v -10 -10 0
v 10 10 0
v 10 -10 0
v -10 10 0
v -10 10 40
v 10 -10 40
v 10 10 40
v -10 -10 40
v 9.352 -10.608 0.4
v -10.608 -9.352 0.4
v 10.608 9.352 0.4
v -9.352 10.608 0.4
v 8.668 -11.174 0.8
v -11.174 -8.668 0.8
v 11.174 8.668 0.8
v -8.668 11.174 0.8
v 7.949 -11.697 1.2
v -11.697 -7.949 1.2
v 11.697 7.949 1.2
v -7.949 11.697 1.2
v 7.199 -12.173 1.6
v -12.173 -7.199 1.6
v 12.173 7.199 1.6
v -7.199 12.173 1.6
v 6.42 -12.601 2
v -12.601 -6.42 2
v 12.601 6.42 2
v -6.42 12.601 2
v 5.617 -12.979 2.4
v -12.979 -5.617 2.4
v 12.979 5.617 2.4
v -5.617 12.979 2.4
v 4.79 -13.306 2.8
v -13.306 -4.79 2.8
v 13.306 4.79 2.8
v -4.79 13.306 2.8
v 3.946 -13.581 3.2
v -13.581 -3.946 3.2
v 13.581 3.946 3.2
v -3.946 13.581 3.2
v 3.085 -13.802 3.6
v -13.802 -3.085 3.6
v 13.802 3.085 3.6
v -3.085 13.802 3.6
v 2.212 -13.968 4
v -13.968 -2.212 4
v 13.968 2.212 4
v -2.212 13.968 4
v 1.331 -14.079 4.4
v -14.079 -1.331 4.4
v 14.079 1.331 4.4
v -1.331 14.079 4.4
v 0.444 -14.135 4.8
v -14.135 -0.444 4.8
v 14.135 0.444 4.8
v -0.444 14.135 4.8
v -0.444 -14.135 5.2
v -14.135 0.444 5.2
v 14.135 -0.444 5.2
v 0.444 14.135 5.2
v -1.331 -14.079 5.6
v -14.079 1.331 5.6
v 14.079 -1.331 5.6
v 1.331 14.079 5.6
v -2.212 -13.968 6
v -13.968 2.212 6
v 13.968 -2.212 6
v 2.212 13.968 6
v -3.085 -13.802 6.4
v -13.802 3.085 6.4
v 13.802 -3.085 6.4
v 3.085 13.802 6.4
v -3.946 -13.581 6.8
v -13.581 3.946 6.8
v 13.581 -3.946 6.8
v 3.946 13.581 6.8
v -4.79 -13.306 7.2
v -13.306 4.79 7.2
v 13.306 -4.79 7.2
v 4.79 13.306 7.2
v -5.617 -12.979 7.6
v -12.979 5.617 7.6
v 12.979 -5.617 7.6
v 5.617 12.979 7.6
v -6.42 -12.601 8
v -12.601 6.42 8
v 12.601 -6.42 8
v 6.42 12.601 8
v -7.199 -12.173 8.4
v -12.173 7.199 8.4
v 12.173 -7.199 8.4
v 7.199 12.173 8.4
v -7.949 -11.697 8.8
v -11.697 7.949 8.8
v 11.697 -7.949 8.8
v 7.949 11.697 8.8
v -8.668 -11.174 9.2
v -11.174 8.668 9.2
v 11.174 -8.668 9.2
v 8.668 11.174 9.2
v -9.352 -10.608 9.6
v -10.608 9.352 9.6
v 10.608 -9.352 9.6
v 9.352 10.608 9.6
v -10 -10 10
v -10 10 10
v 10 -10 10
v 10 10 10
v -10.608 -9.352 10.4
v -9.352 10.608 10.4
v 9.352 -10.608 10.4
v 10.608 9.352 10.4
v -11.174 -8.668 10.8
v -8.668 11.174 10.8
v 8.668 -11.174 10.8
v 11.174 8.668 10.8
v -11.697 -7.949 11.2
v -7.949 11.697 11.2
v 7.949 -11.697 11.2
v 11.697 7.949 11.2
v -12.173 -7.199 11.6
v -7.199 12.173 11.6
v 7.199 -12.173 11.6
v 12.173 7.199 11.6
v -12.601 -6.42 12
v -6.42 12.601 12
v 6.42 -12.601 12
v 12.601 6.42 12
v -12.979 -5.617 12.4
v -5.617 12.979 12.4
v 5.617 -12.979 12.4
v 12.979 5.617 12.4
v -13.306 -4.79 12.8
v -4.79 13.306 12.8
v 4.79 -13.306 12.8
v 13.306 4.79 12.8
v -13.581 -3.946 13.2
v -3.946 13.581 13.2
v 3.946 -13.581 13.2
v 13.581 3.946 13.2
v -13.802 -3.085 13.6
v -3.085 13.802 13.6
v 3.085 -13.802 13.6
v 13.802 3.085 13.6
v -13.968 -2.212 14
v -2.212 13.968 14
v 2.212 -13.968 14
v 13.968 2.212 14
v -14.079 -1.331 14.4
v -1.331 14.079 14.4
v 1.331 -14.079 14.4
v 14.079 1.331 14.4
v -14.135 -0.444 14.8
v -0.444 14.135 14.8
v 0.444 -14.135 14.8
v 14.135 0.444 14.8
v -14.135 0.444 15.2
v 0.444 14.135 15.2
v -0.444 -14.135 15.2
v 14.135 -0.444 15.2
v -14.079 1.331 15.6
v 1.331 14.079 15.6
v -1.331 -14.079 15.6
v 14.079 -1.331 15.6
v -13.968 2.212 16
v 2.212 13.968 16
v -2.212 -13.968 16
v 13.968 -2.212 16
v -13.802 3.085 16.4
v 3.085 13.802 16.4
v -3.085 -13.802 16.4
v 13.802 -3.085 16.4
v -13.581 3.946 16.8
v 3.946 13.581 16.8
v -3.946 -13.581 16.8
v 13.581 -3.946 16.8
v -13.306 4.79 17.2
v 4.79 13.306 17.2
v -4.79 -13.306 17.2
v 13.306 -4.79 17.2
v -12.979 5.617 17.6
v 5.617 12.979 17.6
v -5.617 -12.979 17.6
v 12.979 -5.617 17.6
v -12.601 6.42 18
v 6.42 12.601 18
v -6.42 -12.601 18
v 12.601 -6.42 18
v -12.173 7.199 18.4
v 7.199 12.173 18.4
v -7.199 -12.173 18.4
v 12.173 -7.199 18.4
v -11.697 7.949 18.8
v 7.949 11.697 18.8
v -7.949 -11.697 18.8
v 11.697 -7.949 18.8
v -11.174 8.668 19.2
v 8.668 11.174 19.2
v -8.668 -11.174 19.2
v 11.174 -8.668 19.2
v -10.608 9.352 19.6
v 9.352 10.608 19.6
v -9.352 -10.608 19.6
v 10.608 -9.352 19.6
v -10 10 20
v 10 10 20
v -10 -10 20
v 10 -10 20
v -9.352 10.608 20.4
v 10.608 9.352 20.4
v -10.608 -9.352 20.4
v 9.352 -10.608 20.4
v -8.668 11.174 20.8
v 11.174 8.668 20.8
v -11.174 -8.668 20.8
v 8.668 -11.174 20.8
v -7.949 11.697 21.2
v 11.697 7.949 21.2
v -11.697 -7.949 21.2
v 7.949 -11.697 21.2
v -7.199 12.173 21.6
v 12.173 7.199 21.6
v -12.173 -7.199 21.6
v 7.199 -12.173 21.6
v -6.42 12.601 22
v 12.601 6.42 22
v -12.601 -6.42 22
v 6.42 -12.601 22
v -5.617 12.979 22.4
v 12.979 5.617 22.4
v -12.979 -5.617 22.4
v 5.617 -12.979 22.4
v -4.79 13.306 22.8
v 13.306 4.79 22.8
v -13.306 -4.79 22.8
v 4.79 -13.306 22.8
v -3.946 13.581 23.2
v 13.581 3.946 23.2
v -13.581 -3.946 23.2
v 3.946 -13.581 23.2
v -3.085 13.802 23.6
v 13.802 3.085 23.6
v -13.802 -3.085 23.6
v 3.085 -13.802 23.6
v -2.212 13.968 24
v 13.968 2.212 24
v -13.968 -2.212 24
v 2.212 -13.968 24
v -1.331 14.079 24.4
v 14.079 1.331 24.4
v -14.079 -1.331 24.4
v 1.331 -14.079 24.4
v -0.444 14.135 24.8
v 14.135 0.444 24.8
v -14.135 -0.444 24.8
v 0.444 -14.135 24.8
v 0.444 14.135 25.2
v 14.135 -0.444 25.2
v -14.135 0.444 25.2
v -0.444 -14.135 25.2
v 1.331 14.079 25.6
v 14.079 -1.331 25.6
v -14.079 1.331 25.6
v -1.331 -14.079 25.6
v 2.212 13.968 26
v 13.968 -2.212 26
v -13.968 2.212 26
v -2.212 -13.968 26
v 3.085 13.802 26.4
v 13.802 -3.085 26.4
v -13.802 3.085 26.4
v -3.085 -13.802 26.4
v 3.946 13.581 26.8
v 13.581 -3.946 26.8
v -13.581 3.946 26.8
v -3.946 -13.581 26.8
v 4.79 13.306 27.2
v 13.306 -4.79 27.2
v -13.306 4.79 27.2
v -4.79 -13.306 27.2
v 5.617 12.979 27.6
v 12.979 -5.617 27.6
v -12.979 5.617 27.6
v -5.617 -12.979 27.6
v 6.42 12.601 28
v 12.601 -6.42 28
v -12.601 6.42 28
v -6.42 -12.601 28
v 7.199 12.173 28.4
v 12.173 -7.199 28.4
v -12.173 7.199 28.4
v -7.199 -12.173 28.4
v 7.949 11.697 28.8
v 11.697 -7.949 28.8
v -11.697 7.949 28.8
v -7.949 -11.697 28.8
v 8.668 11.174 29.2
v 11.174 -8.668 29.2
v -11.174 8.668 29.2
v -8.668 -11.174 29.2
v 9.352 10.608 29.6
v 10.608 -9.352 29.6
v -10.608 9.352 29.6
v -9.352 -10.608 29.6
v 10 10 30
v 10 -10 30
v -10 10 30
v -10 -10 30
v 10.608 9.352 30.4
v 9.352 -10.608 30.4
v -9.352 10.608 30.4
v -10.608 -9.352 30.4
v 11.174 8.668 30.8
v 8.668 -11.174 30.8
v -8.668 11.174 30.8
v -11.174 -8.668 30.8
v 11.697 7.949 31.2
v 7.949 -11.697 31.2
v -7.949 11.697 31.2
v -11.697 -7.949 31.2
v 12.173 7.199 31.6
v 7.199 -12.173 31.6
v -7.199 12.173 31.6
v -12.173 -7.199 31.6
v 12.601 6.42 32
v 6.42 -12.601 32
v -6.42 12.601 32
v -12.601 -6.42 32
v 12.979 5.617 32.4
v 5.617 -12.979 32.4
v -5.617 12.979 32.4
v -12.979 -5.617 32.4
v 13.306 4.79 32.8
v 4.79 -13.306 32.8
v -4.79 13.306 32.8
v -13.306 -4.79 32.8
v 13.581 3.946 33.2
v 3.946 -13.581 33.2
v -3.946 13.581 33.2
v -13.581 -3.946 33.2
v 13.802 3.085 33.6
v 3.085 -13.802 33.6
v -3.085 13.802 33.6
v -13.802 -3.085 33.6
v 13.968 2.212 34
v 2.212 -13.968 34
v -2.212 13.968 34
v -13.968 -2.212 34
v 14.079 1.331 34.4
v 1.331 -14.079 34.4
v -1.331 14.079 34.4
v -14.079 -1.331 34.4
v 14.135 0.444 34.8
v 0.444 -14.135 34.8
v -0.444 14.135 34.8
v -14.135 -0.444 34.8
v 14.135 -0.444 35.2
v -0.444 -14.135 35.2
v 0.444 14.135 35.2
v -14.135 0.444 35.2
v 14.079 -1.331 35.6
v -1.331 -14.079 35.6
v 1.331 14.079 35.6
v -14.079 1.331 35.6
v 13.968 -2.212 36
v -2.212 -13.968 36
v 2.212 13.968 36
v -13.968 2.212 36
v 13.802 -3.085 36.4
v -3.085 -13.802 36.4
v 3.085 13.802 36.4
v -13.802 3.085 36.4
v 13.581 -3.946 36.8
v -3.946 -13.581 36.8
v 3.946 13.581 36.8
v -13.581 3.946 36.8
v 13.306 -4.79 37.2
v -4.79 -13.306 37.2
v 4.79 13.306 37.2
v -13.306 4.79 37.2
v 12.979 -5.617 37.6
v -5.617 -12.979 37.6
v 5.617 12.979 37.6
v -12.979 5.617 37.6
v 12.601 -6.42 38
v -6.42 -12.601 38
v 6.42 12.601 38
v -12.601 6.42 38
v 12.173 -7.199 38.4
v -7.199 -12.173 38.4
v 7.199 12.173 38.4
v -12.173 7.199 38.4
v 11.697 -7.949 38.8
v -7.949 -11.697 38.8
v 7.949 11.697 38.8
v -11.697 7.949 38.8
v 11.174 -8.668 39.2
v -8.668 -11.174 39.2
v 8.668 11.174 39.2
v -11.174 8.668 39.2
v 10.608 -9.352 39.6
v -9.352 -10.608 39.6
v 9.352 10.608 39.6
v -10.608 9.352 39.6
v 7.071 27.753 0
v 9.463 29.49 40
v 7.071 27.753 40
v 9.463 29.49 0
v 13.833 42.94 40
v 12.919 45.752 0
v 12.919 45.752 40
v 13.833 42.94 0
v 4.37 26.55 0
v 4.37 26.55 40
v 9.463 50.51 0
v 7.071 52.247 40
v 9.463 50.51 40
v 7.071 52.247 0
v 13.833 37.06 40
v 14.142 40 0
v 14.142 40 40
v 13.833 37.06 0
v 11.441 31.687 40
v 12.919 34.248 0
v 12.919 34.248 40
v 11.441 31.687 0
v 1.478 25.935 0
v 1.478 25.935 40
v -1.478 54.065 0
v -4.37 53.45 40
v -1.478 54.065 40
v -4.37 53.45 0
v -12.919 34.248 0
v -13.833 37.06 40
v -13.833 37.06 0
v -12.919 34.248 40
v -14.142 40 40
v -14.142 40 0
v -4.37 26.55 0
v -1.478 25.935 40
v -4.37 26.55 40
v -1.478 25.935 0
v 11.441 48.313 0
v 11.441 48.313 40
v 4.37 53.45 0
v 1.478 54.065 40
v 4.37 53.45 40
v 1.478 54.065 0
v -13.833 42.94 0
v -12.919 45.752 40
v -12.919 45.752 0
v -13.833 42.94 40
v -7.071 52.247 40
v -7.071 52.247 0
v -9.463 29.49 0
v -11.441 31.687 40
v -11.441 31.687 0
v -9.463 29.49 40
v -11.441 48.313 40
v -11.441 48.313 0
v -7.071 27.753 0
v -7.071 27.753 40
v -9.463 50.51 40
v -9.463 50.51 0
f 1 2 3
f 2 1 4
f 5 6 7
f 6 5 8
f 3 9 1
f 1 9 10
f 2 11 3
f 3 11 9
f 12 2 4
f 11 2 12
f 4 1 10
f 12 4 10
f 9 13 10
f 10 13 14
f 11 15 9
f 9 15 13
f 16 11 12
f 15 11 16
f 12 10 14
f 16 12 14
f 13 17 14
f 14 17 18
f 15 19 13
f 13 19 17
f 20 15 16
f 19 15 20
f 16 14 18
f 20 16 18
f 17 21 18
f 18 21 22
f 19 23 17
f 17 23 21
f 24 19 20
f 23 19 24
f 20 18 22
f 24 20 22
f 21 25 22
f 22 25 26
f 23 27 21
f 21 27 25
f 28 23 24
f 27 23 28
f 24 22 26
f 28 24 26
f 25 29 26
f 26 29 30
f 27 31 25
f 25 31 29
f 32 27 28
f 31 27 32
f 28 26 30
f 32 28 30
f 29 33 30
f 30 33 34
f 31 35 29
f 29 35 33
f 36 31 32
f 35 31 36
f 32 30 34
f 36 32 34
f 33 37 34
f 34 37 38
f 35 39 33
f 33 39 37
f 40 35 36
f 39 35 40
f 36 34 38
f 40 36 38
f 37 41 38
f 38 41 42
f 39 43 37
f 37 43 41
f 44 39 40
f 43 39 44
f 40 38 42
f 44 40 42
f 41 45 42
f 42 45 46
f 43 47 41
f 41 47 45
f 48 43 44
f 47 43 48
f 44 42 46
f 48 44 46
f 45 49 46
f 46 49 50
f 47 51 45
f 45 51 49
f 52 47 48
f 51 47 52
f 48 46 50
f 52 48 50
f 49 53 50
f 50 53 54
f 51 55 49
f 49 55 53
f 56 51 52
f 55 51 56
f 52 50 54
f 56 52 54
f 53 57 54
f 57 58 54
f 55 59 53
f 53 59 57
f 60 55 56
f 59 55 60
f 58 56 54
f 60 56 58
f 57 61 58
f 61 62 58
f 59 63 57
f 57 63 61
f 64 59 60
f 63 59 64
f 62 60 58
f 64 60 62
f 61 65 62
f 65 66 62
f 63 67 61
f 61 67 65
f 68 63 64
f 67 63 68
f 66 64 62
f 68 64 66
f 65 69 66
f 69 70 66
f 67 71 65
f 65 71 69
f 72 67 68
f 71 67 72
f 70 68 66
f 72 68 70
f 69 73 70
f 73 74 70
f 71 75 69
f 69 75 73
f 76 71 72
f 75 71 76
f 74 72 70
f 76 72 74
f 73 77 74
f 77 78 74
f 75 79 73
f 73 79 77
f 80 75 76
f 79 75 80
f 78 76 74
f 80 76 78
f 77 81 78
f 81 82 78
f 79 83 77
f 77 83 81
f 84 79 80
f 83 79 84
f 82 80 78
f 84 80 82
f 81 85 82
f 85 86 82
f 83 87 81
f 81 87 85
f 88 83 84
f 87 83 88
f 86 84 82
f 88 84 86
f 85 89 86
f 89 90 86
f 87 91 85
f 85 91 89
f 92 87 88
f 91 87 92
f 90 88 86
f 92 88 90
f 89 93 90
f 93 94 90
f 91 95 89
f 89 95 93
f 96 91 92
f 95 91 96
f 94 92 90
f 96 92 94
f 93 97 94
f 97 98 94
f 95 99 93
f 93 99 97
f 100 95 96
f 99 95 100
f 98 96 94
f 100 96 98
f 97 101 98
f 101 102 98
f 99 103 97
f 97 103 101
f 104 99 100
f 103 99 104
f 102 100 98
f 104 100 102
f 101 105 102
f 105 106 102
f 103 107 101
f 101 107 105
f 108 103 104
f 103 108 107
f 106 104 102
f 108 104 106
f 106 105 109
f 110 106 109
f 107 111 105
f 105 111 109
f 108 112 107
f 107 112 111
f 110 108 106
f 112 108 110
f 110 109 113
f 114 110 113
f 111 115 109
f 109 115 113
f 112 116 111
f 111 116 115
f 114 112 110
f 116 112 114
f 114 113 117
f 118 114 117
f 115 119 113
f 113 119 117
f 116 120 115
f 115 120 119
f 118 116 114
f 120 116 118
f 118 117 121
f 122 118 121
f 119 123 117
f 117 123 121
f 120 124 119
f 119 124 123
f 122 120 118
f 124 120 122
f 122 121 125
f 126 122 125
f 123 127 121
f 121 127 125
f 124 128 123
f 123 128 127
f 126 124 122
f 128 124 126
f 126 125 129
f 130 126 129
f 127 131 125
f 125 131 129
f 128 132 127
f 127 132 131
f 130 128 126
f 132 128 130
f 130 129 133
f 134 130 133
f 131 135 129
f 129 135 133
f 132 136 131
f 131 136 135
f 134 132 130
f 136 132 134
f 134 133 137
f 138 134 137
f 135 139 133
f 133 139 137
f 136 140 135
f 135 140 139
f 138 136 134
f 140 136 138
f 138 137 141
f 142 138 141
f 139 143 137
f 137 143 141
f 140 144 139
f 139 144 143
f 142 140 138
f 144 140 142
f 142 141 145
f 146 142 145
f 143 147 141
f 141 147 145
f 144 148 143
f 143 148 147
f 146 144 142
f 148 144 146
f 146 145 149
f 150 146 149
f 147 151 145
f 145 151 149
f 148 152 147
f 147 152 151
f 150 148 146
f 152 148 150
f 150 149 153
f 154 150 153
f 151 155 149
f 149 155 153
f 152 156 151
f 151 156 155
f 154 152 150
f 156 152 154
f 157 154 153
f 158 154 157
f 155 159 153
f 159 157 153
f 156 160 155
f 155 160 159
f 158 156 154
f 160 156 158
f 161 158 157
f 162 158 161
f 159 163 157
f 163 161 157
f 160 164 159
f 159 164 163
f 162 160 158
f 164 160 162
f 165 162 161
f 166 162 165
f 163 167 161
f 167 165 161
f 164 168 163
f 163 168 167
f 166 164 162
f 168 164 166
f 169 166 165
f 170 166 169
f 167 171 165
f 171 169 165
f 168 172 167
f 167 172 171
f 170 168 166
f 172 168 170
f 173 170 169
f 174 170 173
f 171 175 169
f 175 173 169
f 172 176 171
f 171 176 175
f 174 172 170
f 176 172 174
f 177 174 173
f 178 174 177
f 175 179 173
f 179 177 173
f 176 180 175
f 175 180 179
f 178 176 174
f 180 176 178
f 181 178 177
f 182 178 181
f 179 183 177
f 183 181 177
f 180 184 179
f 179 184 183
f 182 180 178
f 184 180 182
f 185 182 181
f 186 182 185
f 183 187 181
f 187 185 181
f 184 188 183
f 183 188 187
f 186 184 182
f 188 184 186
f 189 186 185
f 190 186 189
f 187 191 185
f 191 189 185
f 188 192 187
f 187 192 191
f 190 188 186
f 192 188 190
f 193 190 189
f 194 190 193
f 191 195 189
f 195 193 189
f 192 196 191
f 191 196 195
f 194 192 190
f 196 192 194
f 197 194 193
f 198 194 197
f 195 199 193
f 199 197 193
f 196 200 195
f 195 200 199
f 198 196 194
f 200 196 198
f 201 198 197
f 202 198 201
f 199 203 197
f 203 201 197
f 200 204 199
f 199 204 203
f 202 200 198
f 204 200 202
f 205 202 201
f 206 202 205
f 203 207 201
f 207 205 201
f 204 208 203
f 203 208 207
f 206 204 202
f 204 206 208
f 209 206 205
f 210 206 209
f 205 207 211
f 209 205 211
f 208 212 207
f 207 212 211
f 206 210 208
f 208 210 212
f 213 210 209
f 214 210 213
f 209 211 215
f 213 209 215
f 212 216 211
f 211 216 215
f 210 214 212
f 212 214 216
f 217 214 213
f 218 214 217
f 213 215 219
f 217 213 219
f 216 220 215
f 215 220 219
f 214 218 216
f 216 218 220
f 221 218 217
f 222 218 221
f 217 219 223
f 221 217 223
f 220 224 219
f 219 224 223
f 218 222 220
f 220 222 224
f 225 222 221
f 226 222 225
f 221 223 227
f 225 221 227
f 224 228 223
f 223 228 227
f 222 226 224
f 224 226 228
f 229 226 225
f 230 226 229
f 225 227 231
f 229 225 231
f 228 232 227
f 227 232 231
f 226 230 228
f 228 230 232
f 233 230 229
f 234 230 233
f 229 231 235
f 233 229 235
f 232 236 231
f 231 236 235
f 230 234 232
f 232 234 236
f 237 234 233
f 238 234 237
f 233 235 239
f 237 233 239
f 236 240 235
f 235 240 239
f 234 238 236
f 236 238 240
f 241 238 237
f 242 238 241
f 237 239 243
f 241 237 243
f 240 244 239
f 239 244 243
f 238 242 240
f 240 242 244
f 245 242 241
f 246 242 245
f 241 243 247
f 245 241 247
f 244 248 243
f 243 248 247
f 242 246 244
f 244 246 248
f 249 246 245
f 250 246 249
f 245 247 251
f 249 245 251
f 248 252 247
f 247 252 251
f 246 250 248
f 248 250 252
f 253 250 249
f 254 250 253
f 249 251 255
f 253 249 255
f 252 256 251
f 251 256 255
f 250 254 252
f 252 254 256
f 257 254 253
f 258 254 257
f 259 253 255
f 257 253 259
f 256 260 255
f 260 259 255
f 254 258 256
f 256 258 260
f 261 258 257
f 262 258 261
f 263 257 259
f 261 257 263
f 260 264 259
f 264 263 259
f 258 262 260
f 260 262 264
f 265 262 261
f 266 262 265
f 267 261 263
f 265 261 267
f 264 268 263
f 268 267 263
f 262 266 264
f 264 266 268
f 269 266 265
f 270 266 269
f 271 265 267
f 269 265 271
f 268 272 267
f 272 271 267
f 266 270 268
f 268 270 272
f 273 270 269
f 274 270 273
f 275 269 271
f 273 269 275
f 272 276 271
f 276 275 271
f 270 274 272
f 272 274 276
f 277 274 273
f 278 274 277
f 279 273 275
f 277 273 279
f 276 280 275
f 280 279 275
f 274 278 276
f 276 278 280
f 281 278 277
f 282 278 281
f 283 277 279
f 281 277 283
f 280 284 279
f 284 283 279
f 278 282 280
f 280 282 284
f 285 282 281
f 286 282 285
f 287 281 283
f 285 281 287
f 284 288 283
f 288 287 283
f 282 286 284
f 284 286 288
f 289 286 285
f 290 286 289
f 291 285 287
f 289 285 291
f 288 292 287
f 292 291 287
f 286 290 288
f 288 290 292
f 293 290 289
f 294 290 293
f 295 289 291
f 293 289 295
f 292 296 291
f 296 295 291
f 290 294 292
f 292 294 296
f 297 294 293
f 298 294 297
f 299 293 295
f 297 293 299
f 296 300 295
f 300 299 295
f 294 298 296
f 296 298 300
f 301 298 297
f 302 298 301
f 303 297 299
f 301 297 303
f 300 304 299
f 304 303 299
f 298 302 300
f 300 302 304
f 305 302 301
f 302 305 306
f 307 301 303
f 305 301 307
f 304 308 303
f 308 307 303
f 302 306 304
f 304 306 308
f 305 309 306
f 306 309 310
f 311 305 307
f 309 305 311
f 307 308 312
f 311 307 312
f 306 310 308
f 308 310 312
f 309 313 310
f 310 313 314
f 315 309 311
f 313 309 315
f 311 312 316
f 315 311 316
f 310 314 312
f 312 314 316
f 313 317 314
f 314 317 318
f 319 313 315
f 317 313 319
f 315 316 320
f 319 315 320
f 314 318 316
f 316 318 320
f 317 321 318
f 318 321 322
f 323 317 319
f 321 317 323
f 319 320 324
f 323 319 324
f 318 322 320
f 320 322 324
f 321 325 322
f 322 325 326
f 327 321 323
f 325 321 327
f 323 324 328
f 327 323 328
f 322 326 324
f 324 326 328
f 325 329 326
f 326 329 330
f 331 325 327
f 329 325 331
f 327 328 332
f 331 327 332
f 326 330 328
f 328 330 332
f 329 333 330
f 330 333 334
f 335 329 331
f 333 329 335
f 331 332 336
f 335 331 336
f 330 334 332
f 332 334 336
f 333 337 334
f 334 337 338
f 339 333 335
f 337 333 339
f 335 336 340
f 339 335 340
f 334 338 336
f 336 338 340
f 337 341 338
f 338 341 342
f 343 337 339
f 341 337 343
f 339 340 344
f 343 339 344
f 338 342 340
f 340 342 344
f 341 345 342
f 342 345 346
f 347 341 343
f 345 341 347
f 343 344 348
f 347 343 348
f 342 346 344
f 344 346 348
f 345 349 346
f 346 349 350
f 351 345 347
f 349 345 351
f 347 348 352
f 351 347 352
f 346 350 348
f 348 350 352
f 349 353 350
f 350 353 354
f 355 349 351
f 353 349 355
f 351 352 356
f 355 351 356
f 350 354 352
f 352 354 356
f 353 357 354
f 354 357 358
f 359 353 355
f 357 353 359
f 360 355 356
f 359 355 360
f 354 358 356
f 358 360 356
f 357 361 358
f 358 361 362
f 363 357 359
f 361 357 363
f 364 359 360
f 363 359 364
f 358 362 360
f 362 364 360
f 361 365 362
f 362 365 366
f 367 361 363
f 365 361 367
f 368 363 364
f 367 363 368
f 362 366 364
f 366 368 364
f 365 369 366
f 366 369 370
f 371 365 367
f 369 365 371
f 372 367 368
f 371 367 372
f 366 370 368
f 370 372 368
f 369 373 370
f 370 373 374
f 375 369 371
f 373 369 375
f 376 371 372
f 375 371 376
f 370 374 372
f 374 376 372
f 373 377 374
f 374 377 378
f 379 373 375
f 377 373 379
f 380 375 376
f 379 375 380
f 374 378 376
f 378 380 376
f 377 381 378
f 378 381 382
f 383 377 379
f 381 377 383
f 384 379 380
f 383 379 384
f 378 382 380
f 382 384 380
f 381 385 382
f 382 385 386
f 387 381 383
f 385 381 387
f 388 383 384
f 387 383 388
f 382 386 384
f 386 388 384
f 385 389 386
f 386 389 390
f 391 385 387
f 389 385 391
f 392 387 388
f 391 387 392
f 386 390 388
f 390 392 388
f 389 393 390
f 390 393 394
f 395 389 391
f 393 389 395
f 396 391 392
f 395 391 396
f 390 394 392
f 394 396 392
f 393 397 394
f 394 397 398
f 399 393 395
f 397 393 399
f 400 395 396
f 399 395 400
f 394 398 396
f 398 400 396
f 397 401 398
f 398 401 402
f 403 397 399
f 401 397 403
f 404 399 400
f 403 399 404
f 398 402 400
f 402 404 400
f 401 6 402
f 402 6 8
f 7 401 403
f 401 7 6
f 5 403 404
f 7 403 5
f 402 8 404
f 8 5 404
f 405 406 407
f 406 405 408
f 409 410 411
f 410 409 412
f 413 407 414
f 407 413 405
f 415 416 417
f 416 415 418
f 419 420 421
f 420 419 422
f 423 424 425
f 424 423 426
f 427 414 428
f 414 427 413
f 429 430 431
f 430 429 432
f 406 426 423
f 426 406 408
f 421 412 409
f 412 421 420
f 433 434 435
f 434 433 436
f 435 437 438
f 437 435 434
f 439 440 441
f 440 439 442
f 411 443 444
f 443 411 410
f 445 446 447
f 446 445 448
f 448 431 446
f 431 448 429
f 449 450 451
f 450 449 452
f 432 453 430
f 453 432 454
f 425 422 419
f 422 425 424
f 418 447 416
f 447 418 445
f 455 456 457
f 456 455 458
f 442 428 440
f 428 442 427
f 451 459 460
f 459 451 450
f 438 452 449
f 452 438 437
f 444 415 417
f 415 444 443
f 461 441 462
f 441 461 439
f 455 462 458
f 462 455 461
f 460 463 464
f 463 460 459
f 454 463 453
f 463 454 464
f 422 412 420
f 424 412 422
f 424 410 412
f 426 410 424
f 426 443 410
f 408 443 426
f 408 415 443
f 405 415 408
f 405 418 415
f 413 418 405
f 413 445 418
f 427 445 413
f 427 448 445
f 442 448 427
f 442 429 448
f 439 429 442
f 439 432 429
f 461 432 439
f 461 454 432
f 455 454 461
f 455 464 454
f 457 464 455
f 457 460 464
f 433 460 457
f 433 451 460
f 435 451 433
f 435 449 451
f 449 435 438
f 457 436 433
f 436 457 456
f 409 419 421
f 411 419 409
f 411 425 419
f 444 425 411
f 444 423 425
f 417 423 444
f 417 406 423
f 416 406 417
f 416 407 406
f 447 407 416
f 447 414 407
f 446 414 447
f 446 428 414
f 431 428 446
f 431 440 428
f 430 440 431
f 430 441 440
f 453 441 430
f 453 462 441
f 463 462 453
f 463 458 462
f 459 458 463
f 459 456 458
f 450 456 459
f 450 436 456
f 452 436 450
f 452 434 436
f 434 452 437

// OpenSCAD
// testing OpenSCAD scripting

color("gray") {
  linear_extrude(height = 40, twist = 360, slices = 100) {
    square(20, center = true);
  }
}

color("blue") {
  translate([0, 40, 20]) {
    cylinder(d = 20 * sqrt(2), h = 40, center = true);
  }
}
